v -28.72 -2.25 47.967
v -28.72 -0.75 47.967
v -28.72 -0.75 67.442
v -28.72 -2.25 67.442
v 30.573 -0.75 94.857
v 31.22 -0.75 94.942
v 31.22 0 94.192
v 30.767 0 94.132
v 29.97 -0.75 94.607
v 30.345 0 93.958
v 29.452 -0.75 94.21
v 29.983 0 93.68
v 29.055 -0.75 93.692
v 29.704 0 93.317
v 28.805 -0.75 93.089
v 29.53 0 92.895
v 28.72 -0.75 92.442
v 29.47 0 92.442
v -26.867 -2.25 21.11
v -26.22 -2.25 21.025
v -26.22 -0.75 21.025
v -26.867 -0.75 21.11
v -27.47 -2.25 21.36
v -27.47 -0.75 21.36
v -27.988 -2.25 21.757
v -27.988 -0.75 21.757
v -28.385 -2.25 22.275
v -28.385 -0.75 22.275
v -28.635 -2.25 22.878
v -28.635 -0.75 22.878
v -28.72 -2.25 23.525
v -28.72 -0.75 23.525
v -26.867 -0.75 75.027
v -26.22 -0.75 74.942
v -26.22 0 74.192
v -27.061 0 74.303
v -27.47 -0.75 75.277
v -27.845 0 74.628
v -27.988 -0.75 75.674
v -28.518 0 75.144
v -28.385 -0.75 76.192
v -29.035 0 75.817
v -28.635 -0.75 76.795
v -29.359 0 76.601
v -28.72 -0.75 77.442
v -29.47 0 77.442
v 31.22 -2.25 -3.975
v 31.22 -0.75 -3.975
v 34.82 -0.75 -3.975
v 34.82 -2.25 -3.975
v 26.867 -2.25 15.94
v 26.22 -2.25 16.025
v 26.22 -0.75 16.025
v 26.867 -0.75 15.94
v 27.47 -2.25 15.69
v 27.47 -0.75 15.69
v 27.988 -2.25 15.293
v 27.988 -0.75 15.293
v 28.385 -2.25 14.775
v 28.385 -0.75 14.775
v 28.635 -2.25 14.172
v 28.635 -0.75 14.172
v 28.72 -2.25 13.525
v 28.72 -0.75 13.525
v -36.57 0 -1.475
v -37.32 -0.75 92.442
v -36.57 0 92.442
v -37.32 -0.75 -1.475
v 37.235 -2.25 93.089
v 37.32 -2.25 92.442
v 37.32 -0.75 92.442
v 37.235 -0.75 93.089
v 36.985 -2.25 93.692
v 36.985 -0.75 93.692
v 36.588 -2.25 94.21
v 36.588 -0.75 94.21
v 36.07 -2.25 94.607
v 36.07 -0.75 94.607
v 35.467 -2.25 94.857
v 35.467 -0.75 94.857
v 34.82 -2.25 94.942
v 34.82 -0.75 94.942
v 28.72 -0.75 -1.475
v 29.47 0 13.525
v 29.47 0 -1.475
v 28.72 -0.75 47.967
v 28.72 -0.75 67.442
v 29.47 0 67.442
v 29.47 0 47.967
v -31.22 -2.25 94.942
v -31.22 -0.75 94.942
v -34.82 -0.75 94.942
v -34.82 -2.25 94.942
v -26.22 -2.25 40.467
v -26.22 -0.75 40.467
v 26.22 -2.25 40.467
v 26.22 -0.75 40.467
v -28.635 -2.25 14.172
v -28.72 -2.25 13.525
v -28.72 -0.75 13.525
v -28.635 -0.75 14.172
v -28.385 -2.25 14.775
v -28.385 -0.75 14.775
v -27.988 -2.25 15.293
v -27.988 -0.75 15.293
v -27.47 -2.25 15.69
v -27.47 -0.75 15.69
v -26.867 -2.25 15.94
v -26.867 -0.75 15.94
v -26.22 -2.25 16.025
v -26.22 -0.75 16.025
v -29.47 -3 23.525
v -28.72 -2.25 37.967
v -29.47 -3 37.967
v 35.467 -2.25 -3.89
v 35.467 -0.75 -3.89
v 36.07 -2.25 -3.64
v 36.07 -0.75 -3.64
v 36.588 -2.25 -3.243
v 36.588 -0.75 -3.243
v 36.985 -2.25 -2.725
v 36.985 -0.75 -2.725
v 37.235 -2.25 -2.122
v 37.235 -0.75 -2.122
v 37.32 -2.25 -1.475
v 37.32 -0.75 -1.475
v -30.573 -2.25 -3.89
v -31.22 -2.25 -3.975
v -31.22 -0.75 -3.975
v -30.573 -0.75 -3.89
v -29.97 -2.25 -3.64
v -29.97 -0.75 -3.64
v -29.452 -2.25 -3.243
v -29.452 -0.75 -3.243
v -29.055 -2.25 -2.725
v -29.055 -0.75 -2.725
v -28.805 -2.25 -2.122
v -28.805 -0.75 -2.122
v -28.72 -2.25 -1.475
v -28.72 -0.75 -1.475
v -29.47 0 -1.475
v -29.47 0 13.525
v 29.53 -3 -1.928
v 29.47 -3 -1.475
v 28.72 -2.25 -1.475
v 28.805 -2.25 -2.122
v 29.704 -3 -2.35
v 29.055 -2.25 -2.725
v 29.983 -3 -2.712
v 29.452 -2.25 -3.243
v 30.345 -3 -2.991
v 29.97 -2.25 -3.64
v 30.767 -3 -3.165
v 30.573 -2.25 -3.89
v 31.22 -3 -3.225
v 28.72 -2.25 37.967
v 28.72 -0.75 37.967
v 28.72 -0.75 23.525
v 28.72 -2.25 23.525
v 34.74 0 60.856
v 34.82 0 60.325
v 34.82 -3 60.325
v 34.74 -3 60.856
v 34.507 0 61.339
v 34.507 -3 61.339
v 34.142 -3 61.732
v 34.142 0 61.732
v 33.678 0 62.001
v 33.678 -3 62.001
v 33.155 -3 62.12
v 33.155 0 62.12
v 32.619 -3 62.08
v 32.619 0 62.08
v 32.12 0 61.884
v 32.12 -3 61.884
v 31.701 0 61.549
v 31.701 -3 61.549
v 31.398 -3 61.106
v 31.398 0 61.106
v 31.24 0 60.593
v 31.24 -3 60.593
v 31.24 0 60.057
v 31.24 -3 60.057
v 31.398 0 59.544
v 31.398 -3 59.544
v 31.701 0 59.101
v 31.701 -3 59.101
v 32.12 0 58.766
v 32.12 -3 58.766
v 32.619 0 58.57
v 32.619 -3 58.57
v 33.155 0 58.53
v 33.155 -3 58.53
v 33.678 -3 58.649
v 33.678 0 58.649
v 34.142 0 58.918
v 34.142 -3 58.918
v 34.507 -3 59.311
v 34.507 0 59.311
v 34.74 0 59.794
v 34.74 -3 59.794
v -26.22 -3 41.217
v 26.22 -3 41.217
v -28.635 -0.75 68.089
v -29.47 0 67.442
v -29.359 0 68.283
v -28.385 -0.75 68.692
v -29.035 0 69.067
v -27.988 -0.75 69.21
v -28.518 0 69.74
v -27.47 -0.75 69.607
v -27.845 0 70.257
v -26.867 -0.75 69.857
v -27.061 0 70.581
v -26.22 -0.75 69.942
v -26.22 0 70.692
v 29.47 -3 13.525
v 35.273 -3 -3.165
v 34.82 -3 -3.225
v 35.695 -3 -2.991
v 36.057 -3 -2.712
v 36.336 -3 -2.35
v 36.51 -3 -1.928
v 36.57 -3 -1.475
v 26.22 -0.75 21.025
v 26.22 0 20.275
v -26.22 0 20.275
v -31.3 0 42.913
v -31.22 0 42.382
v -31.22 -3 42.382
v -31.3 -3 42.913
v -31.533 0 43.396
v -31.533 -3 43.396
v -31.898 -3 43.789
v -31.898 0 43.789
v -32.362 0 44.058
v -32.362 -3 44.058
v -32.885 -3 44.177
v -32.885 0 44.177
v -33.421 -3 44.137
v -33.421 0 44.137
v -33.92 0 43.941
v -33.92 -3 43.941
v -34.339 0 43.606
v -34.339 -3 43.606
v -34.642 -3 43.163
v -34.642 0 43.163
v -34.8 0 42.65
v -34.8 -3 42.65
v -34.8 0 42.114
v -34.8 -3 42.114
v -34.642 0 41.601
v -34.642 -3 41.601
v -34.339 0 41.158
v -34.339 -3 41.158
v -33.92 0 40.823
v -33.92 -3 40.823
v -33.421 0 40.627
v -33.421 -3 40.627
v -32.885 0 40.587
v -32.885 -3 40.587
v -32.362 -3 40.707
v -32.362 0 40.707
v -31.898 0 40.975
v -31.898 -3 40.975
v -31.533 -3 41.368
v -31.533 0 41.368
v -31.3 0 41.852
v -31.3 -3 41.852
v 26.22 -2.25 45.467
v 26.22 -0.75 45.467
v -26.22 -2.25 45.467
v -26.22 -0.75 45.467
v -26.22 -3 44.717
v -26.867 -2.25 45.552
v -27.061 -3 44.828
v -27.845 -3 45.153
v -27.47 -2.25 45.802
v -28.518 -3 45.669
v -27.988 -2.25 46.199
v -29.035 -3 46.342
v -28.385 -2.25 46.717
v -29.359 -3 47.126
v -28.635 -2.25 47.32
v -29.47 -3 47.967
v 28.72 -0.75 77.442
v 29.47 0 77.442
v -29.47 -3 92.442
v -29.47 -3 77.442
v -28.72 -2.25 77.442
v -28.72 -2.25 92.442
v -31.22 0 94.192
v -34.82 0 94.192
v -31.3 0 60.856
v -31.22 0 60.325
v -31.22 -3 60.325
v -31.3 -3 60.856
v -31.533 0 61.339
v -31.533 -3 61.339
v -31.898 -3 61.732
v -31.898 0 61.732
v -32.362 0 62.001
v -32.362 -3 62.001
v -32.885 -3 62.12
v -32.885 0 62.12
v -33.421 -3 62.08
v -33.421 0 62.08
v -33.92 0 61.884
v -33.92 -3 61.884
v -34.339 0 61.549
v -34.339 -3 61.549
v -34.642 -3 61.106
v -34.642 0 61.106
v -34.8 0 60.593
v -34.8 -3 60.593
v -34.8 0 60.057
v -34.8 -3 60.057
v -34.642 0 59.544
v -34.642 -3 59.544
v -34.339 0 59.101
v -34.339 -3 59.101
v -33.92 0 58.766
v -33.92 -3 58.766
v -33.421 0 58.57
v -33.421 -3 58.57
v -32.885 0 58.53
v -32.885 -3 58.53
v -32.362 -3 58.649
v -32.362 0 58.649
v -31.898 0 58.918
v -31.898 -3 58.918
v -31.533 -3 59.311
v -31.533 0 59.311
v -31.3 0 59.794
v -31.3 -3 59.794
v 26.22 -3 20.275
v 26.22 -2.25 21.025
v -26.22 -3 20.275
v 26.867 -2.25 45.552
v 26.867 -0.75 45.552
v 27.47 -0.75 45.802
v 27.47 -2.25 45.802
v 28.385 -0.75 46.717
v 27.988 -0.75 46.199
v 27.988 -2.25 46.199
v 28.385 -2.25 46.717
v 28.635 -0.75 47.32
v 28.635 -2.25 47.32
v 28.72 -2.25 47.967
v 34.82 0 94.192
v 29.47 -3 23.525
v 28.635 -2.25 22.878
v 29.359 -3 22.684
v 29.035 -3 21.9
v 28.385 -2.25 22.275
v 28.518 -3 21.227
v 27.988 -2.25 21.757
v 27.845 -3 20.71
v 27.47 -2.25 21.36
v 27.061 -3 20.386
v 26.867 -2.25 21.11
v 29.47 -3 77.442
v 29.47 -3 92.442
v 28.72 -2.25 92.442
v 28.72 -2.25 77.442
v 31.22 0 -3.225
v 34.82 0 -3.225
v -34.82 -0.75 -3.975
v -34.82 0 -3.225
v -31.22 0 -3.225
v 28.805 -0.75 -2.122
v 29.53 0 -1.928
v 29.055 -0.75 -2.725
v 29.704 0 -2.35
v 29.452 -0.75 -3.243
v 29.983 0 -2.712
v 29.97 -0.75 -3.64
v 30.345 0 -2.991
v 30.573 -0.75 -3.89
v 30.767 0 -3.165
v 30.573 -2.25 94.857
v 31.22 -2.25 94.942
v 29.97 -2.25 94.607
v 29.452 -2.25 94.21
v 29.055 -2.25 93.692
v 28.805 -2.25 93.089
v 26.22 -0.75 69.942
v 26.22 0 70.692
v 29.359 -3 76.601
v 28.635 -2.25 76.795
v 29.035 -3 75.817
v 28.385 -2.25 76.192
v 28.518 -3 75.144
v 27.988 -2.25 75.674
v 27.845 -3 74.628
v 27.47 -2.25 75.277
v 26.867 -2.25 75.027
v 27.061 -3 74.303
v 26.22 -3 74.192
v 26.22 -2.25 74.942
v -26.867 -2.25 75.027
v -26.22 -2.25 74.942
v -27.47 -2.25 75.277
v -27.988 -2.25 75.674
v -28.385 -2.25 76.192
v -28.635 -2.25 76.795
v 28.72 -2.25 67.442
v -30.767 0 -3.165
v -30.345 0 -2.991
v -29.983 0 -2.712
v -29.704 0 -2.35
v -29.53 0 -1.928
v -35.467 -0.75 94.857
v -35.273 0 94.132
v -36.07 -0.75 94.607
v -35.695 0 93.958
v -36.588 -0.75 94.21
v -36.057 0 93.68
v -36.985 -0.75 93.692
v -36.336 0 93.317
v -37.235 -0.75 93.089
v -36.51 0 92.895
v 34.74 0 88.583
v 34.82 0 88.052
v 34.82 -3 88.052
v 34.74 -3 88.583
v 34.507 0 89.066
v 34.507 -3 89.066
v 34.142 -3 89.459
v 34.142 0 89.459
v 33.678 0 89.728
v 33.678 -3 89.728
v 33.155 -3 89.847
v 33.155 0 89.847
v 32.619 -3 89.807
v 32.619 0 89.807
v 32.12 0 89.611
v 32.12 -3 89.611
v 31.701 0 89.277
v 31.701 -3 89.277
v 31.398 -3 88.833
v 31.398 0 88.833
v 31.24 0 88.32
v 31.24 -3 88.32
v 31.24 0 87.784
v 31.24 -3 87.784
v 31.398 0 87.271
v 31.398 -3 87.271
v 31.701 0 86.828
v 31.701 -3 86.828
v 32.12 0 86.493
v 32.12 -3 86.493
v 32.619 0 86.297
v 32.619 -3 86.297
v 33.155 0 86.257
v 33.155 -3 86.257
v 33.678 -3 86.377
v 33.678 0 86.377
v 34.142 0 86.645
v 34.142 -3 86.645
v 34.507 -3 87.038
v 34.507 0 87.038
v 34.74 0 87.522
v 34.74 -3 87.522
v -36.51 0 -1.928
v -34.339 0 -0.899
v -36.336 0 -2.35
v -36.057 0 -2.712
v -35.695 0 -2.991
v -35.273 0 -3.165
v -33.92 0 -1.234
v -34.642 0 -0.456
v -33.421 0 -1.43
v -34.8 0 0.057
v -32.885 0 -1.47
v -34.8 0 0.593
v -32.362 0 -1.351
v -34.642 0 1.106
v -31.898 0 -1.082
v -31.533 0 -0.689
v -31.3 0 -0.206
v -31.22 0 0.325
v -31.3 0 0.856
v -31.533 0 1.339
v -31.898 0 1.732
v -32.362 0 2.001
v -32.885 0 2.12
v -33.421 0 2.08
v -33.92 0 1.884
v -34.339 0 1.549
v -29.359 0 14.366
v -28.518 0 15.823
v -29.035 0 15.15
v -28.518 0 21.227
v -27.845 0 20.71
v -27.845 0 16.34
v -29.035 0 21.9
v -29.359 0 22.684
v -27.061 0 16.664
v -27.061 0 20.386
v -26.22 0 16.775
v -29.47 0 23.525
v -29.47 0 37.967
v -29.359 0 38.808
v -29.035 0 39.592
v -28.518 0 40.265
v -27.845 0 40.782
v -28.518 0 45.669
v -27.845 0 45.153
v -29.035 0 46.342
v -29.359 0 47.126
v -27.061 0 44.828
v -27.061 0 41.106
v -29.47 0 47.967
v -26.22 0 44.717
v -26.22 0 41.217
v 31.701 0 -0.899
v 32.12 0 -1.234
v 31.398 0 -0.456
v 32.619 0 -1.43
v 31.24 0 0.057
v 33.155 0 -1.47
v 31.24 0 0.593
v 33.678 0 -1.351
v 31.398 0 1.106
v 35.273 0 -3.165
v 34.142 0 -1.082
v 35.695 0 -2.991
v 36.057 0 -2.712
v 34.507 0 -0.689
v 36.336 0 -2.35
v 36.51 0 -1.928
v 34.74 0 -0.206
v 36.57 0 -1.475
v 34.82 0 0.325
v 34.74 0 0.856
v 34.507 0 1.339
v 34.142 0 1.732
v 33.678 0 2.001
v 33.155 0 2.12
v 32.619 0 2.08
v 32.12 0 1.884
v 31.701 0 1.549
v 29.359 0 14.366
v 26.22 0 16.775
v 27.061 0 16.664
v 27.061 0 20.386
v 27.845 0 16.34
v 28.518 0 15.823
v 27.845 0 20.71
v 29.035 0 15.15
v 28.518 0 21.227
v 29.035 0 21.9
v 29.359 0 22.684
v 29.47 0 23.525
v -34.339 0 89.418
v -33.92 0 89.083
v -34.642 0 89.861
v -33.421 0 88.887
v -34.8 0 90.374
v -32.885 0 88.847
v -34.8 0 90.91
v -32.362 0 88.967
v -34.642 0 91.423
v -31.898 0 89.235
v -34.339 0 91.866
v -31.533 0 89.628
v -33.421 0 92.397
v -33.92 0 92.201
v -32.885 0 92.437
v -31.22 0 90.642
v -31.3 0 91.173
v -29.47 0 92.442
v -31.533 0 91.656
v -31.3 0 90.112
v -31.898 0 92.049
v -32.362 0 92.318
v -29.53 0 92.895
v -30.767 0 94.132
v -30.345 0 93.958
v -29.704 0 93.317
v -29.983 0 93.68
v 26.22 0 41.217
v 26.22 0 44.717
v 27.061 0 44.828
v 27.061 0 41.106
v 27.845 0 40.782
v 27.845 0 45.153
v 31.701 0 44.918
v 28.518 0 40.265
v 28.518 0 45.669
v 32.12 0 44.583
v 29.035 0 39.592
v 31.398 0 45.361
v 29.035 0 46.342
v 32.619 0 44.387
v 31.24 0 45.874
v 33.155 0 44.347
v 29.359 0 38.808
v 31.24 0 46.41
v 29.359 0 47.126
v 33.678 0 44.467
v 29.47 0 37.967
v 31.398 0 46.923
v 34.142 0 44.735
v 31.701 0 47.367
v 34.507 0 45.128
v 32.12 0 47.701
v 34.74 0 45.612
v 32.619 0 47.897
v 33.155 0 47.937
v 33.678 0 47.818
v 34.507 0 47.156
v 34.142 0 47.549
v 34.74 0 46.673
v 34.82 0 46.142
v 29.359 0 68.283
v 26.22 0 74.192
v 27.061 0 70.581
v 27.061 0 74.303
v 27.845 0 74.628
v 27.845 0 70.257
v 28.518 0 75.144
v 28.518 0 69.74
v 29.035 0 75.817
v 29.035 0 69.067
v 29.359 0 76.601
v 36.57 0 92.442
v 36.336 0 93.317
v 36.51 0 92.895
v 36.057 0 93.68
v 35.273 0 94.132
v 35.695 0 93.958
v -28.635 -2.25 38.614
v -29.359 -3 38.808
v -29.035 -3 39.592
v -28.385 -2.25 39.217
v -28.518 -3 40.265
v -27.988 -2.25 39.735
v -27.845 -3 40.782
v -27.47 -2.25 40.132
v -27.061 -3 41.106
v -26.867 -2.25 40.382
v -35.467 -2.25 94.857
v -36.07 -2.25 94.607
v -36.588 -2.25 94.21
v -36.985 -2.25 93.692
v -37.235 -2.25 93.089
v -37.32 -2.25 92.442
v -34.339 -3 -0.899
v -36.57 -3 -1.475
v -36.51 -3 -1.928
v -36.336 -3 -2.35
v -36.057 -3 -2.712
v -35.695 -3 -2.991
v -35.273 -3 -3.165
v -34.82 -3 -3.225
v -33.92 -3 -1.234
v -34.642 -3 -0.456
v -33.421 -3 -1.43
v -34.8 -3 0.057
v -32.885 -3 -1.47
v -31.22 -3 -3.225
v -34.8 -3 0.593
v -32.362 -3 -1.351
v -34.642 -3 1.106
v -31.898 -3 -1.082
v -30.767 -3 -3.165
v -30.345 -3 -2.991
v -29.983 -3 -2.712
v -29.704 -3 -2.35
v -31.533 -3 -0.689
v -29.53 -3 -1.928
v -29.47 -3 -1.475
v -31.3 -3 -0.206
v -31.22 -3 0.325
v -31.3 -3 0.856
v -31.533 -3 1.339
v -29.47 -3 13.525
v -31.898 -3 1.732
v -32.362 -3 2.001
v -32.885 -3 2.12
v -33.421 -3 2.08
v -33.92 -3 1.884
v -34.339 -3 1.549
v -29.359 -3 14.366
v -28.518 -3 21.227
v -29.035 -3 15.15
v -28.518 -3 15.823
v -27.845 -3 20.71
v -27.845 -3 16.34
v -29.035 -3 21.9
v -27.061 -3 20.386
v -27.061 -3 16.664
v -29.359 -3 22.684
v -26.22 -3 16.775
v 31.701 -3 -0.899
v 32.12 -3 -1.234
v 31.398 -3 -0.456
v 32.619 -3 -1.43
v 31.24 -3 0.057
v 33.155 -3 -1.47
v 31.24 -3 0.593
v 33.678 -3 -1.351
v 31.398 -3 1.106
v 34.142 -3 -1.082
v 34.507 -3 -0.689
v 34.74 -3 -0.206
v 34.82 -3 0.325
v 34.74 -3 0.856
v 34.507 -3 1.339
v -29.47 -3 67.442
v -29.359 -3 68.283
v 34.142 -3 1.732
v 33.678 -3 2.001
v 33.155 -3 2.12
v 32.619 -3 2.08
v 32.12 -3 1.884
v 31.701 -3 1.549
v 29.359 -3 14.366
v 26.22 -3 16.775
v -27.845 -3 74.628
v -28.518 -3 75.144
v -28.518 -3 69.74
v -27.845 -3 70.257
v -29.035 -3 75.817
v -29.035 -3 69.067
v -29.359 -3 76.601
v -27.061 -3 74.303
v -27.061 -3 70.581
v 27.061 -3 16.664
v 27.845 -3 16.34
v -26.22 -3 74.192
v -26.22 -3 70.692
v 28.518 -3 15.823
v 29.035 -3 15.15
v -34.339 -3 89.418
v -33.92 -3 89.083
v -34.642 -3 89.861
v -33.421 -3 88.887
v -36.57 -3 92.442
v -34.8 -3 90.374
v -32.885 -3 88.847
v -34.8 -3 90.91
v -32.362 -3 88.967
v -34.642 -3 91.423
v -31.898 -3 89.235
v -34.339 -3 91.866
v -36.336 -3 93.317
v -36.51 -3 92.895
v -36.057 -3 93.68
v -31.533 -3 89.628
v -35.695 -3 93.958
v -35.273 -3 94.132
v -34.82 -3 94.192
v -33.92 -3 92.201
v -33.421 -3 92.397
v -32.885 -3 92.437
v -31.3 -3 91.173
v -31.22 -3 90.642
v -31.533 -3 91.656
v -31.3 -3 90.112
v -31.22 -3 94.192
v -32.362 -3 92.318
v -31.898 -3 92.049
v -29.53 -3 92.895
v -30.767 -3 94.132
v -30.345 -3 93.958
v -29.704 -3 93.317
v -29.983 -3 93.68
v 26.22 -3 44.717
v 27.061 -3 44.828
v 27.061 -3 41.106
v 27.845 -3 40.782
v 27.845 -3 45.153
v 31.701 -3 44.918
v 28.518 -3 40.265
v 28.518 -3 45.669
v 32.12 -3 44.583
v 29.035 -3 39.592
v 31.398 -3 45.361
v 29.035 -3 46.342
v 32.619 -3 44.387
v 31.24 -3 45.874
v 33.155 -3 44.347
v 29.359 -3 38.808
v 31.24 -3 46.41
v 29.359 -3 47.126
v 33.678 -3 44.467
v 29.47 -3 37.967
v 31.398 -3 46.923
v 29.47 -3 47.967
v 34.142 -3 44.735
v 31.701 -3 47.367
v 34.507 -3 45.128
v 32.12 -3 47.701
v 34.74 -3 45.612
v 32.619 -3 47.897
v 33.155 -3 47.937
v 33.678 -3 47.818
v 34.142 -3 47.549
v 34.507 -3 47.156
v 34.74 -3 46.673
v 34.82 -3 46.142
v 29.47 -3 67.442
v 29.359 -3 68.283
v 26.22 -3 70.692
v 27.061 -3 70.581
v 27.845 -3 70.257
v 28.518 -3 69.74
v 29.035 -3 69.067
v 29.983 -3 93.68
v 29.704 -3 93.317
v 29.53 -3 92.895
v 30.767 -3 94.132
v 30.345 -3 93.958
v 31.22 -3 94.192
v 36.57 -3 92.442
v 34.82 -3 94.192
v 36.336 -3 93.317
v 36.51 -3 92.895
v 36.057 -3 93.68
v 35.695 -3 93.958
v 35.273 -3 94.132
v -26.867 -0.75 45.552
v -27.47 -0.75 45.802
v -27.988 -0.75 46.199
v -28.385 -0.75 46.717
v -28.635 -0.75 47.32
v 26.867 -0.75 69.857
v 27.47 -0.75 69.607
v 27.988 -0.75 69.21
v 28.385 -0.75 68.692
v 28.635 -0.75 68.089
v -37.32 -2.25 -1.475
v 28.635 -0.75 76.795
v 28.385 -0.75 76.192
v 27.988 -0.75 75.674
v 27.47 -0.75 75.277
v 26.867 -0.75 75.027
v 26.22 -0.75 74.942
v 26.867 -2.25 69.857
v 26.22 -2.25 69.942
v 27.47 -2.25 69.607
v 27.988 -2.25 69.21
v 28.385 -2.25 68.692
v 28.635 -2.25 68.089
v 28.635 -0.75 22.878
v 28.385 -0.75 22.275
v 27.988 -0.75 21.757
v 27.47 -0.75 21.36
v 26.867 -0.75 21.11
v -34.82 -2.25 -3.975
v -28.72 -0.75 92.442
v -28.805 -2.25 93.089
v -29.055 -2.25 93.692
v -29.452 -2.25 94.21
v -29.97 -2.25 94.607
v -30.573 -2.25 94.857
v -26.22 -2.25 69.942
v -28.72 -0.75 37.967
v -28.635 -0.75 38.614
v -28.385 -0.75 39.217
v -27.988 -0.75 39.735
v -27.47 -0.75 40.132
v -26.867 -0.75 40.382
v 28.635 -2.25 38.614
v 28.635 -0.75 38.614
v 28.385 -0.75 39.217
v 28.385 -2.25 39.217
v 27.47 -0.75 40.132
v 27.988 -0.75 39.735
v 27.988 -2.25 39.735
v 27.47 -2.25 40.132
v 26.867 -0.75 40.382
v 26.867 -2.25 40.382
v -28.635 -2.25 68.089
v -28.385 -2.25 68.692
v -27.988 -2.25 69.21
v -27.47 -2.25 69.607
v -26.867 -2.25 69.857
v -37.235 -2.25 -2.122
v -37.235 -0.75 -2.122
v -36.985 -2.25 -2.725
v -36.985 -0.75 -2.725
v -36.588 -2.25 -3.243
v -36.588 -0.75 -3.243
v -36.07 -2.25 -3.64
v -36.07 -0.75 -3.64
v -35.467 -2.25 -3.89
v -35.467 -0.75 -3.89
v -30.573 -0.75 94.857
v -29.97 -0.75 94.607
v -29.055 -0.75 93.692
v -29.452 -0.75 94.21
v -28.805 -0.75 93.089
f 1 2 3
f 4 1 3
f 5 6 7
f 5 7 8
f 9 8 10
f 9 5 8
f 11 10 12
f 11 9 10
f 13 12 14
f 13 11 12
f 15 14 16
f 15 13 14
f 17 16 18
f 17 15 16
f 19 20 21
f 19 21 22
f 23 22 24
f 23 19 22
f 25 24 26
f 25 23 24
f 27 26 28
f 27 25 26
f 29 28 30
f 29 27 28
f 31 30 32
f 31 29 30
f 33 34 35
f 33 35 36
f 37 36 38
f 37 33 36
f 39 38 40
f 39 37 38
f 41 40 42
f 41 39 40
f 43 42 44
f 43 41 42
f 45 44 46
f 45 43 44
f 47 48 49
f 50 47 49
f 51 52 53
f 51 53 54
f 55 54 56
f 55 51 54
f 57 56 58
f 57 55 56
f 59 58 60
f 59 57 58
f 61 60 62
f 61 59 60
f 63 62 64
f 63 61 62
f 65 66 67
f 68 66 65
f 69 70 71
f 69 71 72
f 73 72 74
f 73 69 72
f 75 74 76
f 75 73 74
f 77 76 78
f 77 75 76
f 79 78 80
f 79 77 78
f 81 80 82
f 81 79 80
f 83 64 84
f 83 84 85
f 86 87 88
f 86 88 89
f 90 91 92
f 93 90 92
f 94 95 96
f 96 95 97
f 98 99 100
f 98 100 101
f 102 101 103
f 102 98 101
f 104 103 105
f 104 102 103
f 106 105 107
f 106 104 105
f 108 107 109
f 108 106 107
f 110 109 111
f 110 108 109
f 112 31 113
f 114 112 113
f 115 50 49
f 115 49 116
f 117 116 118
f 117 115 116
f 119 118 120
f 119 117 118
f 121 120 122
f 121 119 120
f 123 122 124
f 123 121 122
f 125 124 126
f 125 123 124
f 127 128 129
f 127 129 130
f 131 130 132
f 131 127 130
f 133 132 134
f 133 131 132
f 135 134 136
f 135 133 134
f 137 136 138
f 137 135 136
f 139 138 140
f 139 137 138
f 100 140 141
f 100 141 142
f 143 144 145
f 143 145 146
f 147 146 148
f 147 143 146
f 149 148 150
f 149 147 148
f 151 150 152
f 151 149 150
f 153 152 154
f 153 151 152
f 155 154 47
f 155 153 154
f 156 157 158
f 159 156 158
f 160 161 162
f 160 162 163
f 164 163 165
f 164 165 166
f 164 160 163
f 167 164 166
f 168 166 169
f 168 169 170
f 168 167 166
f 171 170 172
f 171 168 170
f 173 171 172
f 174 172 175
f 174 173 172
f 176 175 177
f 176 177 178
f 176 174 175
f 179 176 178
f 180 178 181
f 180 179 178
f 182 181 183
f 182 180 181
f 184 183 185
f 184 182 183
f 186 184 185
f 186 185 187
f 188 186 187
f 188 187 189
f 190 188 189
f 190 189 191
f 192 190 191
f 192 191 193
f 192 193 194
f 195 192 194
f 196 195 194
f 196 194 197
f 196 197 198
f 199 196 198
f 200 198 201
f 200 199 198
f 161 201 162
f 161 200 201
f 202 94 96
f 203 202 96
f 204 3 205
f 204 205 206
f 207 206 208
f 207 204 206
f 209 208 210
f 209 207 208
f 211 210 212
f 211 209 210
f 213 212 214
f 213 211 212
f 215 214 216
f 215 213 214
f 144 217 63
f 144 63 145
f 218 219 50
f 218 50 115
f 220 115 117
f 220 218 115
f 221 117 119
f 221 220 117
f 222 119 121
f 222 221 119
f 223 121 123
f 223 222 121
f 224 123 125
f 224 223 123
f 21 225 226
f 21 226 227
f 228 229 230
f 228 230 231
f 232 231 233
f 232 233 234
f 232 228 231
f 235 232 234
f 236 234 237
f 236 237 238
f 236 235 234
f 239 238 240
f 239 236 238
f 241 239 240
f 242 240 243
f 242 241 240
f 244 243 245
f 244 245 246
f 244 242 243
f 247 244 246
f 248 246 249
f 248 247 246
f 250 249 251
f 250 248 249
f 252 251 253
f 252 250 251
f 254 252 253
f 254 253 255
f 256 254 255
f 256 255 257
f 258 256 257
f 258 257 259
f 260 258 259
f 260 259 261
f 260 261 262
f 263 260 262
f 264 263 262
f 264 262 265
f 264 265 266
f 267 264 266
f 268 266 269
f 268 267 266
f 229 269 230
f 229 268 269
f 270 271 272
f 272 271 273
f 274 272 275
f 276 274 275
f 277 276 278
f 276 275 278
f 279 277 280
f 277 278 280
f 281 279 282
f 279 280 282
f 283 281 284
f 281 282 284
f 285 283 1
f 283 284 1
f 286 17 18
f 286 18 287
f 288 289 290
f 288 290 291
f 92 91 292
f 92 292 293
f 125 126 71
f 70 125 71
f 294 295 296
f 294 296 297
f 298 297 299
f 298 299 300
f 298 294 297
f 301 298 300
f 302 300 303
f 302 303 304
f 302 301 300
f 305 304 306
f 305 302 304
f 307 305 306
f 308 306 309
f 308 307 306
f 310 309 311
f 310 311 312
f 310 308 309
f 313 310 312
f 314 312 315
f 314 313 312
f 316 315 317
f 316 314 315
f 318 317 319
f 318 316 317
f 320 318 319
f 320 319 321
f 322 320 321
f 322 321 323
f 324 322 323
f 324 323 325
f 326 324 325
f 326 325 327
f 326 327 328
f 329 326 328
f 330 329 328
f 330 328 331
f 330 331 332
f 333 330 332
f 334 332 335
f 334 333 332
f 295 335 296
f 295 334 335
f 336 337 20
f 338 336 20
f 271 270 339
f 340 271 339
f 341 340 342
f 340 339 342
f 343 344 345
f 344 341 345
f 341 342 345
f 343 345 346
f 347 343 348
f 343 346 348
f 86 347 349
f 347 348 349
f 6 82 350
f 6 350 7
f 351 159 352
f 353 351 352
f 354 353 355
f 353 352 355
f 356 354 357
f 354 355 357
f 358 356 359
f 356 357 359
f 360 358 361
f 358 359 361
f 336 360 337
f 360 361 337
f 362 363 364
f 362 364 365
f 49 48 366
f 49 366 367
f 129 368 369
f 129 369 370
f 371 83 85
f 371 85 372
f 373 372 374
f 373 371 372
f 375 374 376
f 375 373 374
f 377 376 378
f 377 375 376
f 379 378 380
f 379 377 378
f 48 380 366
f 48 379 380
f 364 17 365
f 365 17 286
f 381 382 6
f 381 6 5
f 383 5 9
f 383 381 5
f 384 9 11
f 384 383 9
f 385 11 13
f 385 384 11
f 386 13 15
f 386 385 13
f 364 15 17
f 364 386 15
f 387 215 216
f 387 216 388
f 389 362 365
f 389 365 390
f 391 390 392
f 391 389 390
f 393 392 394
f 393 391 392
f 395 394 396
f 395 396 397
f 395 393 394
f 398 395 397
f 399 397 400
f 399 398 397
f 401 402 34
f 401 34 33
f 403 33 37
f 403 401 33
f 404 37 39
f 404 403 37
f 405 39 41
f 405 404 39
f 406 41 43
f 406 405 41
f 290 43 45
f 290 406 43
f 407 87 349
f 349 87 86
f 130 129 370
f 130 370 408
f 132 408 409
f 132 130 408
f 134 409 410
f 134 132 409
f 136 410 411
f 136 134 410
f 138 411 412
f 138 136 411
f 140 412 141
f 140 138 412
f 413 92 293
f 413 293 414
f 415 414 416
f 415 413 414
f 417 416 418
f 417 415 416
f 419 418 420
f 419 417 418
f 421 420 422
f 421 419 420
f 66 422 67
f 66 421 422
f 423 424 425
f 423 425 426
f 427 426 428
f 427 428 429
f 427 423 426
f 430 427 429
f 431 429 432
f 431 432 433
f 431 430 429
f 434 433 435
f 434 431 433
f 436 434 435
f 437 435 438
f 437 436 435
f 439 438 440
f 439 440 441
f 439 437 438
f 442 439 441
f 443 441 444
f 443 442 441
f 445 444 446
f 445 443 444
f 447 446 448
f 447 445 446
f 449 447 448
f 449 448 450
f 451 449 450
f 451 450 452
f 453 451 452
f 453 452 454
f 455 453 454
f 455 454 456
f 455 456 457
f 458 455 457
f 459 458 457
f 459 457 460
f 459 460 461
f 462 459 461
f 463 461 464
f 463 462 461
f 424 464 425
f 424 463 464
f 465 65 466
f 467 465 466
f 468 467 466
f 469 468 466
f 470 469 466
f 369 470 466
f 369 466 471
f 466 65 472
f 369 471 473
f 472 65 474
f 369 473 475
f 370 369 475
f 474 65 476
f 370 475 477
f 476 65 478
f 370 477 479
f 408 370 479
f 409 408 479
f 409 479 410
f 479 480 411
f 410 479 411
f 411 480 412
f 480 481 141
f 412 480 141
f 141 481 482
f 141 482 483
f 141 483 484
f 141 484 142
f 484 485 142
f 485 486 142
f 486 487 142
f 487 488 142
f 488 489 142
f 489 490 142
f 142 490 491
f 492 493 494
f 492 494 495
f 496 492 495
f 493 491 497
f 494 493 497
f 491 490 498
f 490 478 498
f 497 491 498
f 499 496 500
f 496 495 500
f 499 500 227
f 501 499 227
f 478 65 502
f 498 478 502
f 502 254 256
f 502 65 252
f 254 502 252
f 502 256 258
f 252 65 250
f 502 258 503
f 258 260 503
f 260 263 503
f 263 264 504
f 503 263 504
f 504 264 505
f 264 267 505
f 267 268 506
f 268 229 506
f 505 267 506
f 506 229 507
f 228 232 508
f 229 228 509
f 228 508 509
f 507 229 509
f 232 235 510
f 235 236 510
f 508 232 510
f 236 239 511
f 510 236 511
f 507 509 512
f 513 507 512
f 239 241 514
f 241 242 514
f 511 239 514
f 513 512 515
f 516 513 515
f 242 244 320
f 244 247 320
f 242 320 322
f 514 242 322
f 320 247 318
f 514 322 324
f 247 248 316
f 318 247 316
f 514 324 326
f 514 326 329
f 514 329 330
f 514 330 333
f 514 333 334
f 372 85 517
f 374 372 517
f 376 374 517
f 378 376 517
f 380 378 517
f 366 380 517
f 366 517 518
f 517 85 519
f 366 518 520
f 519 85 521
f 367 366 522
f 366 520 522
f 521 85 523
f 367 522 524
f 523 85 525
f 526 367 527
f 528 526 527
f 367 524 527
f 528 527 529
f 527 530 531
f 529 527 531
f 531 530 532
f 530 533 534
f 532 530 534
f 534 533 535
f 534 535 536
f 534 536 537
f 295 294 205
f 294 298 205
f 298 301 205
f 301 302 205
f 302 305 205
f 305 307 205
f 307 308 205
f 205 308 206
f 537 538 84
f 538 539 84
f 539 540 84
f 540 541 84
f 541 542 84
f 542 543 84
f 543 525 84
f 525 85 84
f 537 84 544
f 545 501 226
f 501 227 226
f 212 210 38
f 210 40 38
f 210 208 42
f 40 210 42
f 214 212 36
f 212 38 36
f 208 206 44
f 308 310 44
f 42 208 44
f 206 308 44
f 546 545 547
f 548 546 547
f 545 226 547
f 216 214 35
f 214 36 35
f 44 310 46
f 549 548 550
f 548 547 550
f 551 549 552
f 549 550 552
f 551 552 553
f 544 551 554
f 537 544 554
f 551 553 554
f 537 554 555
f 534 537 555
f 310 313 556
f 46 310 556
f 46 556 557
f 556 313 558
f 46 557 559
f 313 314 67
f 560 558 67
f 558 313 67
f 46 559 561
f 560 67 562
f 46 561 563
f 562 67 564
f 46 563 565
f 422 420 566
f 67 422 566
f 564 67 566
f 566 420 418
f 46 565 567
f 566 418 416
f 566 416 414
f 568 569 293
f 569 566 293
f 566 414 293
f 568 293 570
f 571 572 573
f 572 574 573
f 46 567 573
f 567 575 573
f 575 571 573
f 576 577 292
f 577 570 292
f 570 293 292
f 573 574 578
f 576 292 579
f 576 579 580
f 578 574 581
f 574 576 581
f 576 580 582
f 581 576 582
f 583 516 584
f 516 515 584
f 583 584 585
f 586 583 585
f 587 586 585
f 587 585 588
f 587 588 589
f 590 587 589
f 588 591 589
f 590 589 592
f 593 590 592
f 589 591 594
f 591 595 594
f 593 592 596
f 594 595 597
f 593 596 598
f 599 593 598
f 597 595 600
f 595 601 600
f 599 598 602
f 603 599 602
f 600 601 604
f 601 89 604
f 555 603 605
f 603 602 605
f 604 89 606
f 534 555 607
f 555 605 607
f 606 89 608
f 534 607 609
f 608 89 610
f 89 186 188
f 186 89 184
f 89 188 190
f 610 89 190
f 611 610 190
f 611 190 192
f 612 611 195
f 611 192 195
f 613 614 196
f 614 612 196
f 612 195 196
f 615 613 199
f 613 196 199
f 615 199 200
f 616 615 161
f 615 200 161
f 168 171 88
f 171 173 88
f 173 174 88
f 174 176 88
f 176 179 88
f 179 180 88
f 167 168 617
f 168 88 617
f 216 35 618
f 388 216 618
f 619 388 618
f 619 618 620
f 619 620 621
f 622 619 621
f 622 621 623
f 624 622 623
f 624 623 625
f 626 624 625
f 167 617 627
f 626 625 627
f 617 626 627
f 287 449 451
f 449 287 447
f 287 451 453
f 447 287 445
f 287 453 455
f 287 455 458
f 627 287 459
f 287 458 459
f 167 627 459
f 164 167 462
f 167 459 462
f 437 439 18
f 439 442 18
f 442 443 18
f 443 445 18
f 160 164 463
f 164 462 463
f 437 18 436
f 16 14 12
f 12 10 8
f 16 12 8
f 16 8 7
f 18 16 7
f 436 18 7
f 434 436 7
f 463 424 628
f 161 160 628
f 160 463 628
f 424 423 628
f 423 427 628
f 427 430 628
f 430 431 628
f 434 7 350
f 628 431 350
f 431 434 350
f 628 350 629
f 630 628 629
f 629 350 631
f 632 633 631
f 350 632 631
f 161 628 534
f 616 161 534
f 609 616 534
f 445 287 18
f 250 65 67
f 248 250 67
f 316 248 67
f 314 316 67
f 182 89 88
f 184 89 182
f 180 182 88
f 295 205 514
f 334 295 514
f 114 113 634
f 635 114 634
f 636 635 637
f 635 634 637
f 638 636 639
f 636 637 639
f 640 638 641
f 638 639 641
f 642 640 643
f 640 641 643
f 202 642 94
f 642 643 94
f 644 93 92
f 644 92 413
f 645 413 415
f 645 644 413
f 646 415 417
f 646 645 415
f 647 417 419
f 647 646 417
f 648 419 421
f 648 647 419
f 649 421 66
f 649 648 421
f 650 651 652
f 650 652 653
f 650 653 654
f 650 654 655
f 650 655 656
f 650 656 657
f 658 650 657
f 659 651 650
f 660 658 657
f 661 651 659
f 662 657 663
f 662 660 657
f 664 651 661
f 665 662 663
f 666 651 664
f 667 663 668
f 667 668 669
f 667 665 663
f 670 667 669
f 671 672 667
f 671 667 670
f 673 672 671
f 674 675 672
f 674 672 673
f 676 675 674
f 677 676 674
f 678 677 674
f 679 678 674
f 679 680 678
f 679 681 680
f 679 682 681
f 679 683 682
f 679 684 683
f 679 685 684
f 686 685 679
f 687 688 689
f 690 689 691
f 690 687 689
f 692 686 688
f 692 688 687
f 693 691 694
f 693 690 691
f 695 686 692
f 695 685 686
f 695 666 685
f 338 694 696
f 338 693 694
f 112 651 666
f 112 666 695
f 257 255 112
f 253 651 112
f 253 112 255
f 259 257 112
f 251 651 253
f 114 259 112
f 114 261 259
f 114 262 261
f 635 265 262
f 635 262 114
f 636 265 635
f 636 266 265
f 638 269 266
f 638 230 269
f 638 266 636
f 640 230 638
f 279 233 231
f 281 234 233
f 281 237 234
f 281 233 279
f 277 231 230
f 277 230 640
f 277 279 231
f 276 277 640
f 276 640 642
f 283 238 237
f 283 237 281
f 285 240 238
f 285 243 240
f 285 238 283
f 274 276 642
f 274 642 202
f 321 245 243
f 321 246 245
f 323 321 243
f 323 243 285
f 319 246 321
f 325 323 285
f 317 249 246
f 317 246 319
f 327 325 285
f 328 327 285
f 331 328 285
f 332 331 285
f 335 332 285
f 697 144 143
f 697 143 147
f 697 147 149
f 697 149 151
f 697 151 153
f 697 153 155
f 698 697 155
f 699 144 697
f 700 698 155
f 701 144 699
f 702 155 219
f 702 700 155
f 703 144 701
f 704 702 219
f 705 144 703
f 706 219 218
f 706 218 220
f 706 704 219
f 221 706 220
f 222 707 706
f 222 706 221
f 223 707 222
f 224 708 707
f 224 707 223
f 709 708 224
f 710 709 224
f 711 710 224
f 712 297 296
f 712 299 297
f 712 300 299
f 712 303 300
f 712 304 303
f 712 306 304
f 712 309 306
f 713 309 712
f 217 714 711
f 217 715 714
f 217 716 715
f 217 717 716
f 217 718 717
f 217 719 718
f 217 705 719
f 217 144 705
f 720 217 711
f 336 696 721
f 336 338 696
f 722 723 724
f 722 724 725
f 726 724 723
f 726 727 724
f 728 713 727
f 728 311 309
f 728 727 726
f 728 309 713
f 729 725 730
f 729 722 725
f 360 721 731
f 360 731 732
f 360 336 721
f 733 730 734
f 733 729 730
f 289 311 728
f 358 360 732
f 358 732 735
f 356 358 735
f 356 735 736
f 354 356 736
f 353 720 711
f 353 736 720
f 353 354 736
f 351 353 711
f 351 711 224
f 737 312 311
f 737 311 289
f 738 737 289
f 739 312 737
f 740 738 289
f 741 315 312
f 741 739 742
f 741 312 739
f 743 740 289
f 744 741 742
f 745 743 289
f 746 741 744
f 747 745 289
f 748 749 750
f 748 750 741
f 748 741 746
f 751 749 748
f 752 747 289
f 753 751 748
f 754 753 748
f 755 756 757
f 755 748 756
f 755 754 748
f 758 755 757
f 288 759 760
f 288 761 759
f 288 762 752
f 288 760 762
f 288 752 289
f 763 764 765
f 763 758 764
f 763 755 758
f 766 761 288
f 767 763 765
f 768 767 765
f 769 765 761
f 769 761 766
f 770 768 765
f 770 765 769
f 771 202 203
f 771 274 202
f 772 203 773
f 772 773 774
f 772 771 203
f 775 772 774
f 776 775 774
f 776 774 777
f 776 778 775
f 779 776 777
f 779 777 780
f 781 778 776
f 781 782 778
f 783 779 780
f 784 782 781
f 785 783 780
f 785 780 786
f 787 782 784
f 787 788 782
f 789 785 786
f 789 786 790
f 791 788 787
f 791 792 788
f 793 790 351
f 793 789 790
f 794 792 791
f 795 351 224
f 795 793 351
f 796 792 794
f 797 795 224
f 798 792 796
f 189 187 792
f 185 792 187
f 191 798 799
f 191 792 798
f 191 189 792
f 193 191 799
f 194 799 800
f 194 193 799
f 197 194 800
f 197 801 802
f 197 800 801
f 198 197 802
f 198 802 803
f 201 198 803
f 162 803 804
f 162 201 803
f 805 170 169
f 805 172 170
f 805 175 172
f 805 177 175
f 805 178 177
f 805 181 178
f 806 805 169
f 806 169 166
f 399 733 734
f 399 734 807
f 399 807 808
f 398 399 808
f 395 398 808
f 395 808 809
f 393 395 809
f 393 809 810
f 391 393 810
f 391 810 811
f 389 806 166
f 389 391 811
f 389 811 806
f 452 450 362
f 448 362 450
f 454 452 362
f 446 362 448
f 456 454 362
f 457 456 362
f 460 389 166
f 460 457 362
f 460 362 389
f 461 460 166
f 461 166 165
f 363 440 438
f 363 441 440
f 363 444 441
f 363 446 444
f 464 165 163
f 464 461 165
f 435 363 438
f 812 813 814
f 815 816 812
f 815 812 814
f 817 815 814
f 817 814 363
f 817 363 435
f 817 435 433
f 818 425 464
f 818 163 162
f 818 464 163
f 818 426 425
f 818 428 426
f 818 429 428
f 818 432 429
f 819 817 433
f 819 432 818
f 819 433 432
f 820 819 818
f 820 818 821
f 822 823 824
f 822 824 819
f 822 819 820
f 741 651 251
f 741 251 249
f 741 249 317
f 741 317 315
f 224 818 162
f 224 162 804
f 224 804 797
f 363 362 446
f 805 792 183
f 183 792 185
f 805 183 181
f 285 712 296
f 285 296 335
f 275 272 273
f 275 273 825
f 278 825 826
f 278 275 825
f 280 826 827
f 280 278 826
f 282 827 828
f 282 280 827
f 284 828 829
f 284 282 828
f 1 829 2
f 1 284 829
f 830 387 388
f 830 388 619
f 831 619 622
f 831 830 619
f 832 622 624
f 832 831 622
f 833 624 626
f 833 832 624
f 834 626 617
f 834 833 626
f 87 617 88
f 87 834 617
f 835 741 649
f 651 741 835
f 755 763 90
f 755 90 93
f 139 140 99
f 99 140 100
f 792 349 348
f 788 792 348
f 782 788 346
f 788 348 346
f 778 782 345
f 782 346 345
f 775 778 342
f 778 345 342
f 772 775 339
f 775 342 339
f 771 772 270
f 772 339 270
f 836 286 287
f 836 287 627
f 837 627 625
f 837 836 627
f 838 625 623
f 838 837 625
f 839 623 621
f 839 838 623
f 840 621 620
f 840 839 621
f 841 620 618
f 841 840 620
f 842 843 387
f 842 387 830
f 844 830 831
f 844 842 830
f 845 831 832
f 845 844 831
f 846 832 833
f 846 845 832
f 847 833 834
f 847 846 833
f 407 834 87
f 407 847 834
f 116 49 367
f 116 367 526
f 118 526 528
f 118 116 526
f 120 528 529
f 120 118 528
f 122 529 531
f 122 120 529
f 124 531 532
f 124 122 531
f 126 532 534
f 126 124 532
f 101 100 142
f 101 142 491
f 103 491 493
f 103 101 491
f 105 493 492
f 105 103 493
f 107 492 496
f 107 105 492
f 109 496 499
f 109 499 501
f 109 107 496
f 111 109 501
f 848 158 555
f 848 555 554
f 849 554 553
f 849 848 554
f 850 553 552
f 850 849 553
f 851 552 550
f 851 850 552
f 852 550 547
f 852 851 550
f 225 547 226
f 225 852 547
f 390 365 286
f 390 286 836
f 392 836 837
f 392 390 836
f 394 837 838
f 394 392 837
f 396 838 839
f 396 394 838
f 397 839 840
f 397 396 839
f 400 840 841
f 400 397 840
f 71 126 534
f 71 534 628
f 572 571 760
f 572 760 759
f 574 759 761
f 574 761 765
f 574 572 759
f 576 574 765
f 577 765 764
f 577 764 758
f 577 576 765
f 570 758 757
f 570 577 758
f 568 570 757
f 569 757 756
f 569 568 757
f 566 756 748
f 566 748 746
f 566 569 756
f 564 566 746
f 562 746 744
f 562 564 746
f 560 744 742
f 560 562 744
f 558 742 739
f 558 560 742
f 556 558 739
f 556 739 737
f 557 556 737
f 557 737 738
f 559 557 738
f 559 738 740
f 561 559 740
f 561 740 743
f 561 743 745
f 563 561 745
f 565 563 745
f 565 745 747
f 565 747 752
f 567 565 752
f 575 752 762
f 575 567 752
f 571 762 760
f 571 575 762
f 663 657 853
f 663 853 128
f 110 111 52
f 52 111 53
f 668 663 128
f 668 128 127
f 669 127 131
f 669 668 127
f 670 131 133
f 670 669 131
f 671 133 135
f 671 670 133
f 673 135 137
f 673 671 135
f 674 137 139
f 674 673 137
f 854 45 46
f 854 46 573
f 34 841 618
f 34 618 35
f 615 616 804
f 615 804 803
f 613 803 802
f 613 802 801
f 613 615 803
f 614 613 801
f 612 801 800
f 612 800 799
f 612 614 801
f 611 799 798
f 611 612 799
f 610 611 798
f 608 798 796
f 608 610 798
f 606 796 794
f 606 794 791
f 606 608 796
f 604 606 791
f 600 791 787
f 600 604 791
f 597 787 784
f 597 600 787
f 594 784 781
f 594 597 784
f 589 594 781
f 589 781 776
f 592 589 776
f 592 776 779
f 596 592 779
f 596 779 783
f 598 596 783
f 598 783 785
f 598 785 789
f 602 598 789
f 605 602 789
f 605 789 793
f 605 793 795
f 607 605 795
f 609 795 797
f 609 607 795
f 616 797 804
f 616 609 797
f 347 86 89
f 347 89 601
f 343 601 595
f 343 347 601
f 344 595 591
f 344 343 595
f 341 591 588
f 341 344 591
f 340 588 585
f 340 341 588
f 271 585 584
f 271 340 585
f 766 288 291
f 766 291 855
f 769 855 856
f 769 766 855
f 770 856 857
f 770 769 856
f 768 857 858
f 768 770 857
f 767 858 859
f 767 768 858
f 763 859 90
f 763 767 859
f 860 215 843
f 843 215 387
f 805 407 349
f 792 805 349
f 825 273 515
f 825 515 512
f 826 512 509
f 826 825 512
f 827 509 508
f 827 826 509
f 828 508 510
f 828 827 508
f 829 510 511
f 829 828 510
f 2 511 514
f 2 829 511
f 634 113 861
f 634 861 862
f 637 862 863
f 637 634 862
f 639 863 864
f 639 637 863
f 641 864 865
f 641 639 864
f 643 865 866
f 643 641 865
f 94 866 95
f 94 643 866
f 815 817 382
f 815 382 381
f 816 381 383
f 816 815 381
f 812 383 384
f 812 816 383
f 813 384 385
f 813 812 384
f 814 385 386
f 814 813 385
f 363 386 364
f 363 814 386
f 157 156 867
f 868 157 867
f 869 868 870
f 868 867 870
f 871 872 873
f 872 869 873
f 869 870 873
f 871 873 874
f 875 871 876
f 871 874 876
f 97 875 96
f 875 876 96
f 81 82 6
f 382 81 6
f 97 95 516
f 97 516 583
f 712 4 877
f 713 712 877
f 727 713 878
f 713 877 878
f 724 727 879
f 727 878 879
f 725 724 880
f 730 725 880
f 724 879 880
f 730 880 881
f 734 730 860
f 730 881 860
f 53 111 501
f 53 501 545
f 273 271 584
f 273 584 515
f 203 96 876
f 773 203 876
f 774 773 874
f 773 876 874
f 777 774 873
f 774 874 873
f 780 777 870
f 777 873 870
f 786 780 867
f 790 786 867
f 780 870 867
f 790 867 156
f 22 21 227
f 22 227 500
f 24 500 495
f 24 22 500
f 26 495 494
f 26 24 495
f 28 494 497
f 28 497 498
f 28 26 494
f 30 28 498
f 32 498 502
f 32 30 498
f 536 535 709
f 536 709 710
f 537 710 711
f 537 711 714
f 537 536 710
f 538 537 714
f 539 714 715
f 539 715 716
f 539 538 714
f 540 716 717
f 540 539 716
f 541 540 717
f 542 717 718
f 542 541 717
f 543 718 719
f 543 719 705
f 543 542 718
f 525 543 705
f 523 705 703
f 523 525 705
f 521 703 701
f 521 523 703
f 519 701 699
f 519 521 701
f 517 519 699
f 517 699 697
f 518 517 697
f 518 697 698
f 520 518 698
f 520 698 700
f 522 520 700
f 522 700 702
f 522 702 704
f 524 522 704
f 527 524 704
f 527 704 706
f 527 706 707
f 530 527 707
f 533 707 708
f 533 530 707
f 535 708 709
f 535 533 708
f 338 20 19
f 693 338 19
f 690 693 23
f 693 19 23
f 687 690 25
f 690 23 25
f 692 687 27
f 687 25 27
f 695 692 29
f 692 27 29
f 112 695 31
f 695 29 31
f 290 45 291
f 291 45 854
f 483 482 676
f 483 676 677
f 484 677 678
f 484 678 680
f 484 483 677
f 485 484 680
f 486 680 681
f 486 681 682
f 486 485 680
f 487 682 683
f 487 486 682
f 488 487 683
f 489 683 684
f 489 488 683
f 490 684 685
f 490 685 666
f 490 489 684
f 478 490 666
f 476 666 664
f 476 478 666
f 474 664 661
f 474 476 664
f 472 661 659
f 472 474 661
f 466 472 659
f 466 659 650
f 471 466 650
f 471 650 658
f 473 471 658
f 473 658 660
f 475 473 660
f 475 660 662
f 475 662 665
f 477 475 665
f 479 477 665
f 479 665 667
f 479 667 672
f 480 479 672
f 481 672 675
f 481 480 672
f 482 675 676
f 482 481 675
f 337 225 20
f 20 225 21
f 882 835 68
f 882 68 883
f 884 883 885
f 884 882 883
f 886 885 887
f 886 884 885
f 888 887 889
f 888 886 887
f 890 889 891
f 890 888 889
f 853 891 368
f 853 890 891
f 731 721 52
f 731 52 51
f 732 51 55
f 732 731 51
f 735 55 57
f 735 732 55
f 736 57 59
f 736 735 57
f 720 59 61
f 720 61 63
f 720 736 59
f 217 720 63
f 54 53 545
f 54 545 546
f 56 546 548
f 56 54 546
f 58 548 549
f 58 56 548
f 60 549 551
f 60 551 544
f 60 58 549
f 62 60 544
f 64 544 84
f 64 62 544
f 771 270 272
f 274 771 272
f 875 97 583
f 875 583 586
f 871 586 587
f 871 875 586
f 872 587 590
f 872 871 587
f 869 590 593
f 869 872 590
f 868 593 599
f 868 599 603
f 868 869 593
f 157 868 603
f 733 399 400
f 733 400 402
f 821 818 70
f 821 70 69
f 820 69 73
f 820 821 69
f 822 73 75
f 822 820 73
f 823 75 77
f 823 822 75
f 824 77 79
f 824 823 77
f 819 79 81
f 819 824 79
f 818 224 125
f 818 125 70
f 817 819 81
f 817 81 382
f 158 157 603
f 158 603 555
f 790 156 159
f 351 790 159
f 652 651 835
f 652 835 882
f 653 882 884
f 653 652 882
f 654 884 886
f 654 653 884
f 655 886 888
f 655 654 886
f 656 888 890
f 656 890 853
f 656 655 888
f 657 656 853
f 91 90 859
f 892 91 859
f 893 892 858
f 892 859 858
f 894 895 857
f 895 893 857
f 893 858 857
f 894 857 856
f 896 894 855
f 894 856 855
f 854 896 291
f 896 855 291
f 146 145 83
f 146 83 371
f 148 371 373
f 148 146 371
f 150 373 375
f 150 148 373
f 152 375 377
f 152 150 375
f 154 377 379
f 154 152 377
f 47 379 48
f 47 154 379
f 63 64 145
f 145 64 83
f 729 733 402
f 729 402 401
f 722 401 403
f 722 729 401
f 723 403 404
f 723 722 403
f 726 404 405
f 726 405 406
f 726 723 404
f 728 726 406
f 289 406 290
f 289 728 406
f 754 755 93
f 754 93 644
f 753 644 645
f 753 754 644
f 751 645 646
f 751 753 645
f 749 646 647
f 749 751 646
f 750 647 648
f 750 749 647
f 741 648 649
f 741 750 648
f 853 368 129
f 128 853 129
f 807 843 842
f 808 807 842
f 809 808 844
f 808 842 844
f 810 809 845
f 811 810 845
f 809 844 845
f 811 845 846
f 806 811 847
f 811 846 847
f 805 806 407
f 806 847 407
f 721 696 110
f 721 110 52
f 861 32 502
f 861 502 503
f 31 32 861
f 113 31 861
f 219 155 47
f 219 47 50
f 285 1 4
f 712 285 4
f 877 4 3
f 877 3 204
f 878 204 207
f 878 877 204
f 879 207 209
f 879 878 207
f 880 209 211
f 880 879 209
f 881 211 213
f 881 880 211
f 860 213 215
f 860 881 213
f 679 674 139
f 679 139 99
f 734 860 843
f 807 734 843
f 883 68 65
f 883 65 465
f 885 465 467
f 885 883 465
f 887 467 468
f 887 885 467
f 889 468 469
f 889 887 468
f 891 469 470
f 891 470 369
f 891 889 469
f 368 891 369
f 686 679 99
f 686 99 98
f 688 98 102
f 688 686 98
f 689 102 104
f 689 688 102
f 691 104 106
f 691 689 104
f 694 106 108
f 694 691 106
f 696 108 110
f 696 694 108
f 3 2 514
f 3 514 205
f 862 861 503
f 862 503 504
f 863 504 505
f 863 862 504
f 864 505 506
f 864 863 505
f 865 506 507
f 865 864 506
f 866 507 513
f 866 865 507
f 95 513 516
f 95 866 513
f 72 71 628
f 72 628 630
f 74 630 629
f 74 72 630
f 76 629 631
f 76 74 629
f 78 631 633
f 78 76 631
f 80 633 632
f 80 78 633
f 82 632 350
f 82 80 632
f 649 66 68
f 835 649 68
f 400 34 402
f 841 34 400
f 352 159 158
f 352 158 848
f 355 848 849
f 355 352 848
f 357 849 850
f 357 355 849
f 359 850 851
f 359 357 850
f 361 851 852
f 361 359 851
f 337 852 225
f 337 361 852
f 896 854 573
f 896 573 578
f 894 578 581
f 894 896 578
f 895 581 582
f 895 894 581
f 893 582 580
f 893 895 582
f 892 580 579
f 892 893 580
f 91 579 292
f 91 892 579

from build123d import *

# Parameters (mm, degrees)
F0_W     = 0.0285906434
F0_H     = 5
F0_W_2   = 28.72
F0_R     = 1.8
F0_W_3   = 57.44
F1_DEPTH = 3
F2_R     = 2.5
F3_SIZE  = 0.75


# Not quite as in the source:
# - a feature names something its author has since deleted; it is built from what else it names


with BuildPart() as f1:
    # F0 (on Front) → F1 (new body)
    with BuildSketch(Plane.XZ):
        with Locations((-28.7342953217, 18.525)):
            Rectangle(F0_W, F0_H)
        with Locations((28.7342953217, 18.525)):
            Rectangle(F0_W, F0_H)
        with Locations((-14.36, 18.525)):
            Rectangle(F0_W_2, F0_H)
        with Locations((14.36, 18.525)):
            Rectangle(F0_W_2, F0_H)
        with Locations((14.36, 42.9671912789)):
            Rectangle(F0_W_2, F0_H)
        Polygon((28.72, 94.9421003461), (28.72, 74.9421003461), (28.72, 69.9421003461), (28.72, 45.4671912789), (28.72, 40.4671912789), (28.72, 21.025), (28.7485906434, 21.025), (28.7485906434, 16.025), (28.72, 16.025), (28.72, -3.975), (37.32, -3.975), (37.32, 94.9421003461), align=None)
        with Locations((33.02, 0.325)):
            Circle(F0_R, mode=Mode.SUBTRACT)
        with Locations((33.02, 46.1421912789)):
            Circle(F0_R, mode=Mode.SUBTRACT)
        with Locations((33.02, 60.325)):
            Circle(F0_R, mode=Mode.SUBTRACT)
        with Locations((33.02, 88.0521912789)):
            Circle(F0_R, mode=Mode.SUBTRACT)
        with Locations((-14.36, 42.9671912789)):
            Rectangle(F0_W_2, F0_H)
        Polygon((-28.72, 94.9421003461), (-37.32, 94.9421003461), (-37.32, -3.975), (-28.72, -3.975), (-28.72, 16.025), (-28.7485906434, 16.025), (-28.7485906434, 21.025), (-28.72, 21.025), (-28.72, 40.4671912789), (-28.72, 45.4671912789), (-28.72, 69.9421003461), (-28.72, 74.9421003461), align=None)
        with Locations((-33.02, 0.325)):
            Circle(F0_R, mode=Mode.SUBTRACT)
        with Locations((-33.02, 42.3821003461)):
            Circle(F0_R, mode=Mode.SUBTRACT)
        with Locations((-33.02, 60.325)):
            Circle(F0_R, mode=Mode.SUBTRACT)
        with Locations((-33.02, 90.6421003461)):
            Circle(F0_R, mode=Mode.SUBTRACT)
        with Locations((0, 72.4421003461)):
            Rectangle(F0_W_3, F0_H)
    extrude(amount=F1_DEPTH)

    # F2
    f2_edges = [f1.edges().sort_by_distance(p)[0] for p in [
        (-28.72, -1.5, 45.467191),
        (28.72, -1.5, 45.467191),
        (-28.72, -1.5, 40.467191),
        (28.72, -1.5, 40.467191),
        (-28.72, -1.5, 21.025),
        (28.72, -1.5, 21.025),
        (-28.72, -1.5, 16.025),
        (28.72, -1.5, 16.025),
        (28.72, -1.5, -3.975),
        (37.32, -1.5, -3.975),
        (-37.32, -1.5, -3.975),
        (-28.72, -1.5, -3.975),
        (37.32, -1.5, 94.9421),
        (28.72, -1.5, 94.9421),
        (-37.32, -1.5, 94.9421),
        (-28.72, -1.5, 94.9421),
        (-28.72, -1.5, 69.9421),
        (28.72, -1.5, 69.9421),
        (-28.72, -1.5, 74.9421),
        (28.72, -1.5, 74.9421),
    ]]
    fillet(f2_edges, radius=F2_R)

    # F3
    f3_edges = [f1.edges().sort_by_distance(p)[0] for p in [
        (0, 0, 16.025),
        (0, 0, 40.467191),
        (-33.02, -3, 94.9421),
        (0, -3, 40.467191),
        (0, -3, 69.9421),
        (0, 0, 69.9421),
    ]]
    chamfer(f3_edges, length=F3_SIZE)


solid = f1.part
